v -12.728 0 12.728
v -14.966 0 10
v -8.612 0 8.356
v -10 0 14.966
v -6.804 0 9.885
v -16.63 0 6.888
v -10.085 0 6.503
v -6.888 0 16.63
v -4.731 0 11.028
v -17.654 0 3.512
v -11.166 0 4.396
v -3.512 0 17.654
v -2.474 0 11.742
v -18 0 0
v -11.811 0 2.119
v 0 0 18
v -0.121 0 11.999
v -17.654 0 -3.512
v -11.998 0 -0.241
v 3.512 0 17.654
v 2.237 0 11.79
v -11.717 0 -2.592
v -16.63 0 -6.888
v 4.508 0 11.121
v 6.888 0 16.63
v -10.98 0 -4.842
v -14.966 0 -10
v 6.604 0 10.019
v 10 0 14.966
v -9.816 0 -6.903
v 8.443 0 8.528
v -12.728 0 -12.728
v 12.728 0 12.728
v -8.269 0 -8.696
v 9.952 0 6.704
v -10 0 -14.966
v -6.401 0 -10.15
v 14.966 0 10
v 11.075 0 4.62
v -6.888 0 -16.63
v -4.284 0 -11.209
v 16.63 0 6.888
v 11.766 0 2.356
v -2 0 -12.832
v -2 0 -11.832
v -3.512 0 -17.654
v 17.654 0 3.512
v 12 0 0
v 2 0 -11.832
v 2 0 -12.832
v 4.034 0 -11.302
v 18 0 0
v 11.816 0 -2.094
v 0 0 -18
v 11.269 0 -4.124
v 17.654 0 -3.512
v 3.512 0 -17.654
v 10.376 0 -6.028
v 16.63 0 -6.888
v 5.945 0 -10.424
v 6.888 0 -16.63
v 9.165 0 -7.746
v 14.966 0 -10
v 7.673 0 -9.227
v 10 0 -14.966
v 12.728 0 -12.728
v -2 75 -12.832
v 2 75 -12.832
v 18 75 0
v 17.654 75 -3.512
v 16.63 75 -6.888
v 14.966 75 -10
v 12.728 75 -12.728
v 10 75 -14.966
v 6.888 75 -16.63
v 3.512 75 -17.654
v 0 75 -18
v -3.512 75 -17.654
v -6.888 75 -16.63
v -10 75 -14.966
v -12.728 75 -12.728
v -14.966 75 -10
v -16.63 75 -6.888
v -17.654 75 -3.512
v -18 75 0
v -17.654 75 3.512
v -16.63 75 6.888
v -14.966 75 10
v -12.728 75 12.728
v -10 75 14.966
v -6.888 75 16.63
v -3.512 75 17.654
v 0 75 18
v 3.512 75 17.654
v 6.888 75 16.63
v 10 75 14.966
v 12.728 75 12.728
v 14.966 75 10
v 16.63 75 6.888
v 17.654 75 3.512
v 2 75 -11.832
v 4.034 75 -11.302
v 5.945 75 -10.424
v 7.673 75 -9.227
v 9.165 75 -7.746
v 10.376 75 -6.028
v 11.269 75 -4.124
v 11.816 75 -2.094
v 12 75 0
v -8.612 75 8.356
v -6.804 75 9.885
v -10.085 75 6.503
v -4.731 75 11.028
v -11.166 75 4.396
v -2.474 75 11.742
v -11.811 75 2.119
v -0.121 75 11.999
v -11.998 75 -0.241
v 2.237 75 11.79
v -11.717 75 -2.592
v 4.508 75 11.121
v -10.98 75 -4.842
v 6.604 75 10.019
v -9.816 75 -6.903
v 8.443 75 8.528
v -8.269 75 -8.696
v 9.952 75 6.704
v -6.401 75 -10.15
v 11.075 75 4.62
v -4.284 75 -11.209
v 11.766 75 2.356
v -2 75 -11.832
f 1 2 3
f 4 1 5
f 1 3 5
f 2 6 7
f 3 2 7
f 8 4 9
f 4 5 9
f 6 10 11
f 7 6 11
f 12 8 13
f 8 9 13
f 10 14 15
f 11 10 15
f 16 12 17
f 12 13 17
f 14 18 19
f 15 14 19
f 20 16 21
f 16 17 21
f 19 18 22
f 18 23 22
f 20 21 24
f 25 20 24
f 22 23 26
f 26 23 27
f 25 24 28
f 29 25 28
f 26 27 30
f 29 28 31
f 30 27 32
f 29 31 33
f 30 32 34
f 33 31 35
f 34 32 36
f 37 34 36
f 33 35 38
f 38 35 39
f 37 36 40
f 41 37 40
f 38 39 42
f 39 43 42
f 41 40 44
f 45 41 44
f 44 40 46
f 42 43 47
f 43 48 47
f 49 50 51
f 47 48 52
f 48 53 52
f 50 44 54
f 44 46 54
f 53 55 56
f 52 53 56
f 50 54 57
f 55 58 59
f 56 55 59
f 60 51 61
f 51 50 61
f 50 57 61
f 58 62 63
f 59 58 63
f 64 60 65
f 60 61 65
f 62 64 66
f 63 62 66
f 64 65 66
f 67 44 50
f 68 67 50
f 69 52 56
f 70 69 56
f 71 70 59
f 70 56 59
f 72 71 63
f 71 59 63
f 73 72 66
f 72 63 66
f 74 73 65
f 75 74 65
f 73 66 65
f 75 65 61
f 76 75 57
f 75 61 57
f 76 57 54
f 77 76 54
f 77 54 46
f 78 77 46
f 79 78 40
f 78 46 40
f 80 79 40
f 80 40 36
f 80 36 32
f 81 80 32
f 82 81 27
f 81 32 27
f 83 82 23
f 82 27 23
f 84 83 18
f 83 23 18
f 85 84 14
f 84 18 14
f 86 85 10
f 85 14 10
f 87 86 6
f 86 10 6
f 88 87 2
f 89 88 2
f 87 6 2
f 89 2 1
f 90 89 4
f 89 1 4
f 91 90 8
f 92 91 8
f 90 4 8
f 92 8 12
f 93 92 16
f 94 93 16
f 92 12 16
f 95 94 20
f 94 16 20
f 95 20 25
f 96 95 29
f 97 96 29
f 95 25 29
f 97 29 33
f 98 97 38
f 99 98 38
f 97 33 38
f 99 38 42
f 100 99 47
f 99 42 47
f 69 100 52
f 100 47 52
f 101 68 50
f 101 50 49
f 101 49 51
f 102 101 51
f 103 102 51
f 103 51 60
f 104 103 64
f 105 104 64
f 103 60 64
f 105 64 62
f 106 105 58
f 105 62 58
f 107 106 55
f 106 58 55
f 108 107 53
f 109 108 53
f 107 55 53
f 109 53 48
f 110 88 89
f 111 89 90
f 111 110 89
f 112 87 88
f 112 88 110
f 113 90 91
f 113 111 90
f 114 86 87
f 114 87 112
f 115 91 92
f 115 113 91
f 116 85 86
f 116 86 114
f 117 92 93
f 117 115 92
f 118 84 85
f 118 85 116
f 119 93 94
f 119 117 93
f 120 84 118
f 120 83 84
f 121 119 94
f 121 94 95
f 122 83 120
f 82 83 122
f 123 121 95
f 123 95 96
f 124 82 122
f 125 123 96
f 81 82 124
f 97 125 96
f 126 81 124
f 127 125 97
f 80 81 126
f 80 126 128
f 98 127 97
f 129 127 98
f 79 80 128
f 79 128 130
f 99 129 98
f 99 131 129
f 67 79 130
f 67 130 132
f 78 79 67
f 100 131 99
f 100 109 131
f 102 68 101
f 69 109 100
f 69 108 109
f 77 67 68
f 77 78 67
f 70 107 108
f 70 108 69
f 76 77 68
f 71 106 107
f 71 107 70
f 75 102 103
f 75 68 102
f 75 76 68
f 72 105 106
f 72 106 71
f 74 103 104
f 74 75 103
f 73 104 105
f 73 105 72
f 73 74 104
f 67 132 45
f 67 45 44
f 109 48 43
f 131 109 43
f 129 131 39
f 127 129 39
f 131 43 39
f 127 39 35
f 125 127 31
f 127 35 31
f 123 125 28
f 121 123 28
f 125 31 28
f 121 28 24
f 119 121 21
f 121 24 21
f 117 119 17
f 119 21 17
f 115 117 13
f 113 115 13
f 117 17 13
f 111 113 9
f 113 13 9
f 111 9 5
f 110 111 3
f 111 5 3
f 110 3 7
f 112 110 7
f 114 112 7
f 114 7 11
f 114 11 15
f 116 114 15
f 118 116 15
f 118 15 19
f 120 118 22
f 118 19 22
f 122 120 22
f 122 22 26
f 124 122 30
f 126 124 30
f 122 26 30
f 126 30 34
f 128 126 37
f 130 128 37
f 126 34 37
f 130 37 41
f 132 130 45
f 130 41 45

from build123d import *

# Parameters (mm, degrees)
SKETCH1_R           = 18
BOSS_EXTRUDE1_DEPTH = 75


with BuildPart() as part:
    # Sketch1 → Boss-Extrude1 (new body)
    with BuildSketch(Plane(origin=(0, 0, 0), x_dir=(1, 0, 0), z_dir=(0, 1, 0))):
        Circle(SKETCH1_R)
        with BuildLine():
            Line((-2, 11.832159566), (-2, 12.832159566))
            Line((-2, 12.832159566), (2, 12.832159566))
            Line((2, 12.832159566), (2, 11.832159566))
            ThreePointArc((2, 11.832159566), (9.16515139, 7.745966692), (12, 0))
            ThreePointArc((12, 0), (-7.745966692, -9.16515139), (-2, 11.832159566))
        make_face(mode=Mode.SUBTRACT)
    extrude(amount=BOSS_EXTRUDE1_DEPTH)


solid = part.part
